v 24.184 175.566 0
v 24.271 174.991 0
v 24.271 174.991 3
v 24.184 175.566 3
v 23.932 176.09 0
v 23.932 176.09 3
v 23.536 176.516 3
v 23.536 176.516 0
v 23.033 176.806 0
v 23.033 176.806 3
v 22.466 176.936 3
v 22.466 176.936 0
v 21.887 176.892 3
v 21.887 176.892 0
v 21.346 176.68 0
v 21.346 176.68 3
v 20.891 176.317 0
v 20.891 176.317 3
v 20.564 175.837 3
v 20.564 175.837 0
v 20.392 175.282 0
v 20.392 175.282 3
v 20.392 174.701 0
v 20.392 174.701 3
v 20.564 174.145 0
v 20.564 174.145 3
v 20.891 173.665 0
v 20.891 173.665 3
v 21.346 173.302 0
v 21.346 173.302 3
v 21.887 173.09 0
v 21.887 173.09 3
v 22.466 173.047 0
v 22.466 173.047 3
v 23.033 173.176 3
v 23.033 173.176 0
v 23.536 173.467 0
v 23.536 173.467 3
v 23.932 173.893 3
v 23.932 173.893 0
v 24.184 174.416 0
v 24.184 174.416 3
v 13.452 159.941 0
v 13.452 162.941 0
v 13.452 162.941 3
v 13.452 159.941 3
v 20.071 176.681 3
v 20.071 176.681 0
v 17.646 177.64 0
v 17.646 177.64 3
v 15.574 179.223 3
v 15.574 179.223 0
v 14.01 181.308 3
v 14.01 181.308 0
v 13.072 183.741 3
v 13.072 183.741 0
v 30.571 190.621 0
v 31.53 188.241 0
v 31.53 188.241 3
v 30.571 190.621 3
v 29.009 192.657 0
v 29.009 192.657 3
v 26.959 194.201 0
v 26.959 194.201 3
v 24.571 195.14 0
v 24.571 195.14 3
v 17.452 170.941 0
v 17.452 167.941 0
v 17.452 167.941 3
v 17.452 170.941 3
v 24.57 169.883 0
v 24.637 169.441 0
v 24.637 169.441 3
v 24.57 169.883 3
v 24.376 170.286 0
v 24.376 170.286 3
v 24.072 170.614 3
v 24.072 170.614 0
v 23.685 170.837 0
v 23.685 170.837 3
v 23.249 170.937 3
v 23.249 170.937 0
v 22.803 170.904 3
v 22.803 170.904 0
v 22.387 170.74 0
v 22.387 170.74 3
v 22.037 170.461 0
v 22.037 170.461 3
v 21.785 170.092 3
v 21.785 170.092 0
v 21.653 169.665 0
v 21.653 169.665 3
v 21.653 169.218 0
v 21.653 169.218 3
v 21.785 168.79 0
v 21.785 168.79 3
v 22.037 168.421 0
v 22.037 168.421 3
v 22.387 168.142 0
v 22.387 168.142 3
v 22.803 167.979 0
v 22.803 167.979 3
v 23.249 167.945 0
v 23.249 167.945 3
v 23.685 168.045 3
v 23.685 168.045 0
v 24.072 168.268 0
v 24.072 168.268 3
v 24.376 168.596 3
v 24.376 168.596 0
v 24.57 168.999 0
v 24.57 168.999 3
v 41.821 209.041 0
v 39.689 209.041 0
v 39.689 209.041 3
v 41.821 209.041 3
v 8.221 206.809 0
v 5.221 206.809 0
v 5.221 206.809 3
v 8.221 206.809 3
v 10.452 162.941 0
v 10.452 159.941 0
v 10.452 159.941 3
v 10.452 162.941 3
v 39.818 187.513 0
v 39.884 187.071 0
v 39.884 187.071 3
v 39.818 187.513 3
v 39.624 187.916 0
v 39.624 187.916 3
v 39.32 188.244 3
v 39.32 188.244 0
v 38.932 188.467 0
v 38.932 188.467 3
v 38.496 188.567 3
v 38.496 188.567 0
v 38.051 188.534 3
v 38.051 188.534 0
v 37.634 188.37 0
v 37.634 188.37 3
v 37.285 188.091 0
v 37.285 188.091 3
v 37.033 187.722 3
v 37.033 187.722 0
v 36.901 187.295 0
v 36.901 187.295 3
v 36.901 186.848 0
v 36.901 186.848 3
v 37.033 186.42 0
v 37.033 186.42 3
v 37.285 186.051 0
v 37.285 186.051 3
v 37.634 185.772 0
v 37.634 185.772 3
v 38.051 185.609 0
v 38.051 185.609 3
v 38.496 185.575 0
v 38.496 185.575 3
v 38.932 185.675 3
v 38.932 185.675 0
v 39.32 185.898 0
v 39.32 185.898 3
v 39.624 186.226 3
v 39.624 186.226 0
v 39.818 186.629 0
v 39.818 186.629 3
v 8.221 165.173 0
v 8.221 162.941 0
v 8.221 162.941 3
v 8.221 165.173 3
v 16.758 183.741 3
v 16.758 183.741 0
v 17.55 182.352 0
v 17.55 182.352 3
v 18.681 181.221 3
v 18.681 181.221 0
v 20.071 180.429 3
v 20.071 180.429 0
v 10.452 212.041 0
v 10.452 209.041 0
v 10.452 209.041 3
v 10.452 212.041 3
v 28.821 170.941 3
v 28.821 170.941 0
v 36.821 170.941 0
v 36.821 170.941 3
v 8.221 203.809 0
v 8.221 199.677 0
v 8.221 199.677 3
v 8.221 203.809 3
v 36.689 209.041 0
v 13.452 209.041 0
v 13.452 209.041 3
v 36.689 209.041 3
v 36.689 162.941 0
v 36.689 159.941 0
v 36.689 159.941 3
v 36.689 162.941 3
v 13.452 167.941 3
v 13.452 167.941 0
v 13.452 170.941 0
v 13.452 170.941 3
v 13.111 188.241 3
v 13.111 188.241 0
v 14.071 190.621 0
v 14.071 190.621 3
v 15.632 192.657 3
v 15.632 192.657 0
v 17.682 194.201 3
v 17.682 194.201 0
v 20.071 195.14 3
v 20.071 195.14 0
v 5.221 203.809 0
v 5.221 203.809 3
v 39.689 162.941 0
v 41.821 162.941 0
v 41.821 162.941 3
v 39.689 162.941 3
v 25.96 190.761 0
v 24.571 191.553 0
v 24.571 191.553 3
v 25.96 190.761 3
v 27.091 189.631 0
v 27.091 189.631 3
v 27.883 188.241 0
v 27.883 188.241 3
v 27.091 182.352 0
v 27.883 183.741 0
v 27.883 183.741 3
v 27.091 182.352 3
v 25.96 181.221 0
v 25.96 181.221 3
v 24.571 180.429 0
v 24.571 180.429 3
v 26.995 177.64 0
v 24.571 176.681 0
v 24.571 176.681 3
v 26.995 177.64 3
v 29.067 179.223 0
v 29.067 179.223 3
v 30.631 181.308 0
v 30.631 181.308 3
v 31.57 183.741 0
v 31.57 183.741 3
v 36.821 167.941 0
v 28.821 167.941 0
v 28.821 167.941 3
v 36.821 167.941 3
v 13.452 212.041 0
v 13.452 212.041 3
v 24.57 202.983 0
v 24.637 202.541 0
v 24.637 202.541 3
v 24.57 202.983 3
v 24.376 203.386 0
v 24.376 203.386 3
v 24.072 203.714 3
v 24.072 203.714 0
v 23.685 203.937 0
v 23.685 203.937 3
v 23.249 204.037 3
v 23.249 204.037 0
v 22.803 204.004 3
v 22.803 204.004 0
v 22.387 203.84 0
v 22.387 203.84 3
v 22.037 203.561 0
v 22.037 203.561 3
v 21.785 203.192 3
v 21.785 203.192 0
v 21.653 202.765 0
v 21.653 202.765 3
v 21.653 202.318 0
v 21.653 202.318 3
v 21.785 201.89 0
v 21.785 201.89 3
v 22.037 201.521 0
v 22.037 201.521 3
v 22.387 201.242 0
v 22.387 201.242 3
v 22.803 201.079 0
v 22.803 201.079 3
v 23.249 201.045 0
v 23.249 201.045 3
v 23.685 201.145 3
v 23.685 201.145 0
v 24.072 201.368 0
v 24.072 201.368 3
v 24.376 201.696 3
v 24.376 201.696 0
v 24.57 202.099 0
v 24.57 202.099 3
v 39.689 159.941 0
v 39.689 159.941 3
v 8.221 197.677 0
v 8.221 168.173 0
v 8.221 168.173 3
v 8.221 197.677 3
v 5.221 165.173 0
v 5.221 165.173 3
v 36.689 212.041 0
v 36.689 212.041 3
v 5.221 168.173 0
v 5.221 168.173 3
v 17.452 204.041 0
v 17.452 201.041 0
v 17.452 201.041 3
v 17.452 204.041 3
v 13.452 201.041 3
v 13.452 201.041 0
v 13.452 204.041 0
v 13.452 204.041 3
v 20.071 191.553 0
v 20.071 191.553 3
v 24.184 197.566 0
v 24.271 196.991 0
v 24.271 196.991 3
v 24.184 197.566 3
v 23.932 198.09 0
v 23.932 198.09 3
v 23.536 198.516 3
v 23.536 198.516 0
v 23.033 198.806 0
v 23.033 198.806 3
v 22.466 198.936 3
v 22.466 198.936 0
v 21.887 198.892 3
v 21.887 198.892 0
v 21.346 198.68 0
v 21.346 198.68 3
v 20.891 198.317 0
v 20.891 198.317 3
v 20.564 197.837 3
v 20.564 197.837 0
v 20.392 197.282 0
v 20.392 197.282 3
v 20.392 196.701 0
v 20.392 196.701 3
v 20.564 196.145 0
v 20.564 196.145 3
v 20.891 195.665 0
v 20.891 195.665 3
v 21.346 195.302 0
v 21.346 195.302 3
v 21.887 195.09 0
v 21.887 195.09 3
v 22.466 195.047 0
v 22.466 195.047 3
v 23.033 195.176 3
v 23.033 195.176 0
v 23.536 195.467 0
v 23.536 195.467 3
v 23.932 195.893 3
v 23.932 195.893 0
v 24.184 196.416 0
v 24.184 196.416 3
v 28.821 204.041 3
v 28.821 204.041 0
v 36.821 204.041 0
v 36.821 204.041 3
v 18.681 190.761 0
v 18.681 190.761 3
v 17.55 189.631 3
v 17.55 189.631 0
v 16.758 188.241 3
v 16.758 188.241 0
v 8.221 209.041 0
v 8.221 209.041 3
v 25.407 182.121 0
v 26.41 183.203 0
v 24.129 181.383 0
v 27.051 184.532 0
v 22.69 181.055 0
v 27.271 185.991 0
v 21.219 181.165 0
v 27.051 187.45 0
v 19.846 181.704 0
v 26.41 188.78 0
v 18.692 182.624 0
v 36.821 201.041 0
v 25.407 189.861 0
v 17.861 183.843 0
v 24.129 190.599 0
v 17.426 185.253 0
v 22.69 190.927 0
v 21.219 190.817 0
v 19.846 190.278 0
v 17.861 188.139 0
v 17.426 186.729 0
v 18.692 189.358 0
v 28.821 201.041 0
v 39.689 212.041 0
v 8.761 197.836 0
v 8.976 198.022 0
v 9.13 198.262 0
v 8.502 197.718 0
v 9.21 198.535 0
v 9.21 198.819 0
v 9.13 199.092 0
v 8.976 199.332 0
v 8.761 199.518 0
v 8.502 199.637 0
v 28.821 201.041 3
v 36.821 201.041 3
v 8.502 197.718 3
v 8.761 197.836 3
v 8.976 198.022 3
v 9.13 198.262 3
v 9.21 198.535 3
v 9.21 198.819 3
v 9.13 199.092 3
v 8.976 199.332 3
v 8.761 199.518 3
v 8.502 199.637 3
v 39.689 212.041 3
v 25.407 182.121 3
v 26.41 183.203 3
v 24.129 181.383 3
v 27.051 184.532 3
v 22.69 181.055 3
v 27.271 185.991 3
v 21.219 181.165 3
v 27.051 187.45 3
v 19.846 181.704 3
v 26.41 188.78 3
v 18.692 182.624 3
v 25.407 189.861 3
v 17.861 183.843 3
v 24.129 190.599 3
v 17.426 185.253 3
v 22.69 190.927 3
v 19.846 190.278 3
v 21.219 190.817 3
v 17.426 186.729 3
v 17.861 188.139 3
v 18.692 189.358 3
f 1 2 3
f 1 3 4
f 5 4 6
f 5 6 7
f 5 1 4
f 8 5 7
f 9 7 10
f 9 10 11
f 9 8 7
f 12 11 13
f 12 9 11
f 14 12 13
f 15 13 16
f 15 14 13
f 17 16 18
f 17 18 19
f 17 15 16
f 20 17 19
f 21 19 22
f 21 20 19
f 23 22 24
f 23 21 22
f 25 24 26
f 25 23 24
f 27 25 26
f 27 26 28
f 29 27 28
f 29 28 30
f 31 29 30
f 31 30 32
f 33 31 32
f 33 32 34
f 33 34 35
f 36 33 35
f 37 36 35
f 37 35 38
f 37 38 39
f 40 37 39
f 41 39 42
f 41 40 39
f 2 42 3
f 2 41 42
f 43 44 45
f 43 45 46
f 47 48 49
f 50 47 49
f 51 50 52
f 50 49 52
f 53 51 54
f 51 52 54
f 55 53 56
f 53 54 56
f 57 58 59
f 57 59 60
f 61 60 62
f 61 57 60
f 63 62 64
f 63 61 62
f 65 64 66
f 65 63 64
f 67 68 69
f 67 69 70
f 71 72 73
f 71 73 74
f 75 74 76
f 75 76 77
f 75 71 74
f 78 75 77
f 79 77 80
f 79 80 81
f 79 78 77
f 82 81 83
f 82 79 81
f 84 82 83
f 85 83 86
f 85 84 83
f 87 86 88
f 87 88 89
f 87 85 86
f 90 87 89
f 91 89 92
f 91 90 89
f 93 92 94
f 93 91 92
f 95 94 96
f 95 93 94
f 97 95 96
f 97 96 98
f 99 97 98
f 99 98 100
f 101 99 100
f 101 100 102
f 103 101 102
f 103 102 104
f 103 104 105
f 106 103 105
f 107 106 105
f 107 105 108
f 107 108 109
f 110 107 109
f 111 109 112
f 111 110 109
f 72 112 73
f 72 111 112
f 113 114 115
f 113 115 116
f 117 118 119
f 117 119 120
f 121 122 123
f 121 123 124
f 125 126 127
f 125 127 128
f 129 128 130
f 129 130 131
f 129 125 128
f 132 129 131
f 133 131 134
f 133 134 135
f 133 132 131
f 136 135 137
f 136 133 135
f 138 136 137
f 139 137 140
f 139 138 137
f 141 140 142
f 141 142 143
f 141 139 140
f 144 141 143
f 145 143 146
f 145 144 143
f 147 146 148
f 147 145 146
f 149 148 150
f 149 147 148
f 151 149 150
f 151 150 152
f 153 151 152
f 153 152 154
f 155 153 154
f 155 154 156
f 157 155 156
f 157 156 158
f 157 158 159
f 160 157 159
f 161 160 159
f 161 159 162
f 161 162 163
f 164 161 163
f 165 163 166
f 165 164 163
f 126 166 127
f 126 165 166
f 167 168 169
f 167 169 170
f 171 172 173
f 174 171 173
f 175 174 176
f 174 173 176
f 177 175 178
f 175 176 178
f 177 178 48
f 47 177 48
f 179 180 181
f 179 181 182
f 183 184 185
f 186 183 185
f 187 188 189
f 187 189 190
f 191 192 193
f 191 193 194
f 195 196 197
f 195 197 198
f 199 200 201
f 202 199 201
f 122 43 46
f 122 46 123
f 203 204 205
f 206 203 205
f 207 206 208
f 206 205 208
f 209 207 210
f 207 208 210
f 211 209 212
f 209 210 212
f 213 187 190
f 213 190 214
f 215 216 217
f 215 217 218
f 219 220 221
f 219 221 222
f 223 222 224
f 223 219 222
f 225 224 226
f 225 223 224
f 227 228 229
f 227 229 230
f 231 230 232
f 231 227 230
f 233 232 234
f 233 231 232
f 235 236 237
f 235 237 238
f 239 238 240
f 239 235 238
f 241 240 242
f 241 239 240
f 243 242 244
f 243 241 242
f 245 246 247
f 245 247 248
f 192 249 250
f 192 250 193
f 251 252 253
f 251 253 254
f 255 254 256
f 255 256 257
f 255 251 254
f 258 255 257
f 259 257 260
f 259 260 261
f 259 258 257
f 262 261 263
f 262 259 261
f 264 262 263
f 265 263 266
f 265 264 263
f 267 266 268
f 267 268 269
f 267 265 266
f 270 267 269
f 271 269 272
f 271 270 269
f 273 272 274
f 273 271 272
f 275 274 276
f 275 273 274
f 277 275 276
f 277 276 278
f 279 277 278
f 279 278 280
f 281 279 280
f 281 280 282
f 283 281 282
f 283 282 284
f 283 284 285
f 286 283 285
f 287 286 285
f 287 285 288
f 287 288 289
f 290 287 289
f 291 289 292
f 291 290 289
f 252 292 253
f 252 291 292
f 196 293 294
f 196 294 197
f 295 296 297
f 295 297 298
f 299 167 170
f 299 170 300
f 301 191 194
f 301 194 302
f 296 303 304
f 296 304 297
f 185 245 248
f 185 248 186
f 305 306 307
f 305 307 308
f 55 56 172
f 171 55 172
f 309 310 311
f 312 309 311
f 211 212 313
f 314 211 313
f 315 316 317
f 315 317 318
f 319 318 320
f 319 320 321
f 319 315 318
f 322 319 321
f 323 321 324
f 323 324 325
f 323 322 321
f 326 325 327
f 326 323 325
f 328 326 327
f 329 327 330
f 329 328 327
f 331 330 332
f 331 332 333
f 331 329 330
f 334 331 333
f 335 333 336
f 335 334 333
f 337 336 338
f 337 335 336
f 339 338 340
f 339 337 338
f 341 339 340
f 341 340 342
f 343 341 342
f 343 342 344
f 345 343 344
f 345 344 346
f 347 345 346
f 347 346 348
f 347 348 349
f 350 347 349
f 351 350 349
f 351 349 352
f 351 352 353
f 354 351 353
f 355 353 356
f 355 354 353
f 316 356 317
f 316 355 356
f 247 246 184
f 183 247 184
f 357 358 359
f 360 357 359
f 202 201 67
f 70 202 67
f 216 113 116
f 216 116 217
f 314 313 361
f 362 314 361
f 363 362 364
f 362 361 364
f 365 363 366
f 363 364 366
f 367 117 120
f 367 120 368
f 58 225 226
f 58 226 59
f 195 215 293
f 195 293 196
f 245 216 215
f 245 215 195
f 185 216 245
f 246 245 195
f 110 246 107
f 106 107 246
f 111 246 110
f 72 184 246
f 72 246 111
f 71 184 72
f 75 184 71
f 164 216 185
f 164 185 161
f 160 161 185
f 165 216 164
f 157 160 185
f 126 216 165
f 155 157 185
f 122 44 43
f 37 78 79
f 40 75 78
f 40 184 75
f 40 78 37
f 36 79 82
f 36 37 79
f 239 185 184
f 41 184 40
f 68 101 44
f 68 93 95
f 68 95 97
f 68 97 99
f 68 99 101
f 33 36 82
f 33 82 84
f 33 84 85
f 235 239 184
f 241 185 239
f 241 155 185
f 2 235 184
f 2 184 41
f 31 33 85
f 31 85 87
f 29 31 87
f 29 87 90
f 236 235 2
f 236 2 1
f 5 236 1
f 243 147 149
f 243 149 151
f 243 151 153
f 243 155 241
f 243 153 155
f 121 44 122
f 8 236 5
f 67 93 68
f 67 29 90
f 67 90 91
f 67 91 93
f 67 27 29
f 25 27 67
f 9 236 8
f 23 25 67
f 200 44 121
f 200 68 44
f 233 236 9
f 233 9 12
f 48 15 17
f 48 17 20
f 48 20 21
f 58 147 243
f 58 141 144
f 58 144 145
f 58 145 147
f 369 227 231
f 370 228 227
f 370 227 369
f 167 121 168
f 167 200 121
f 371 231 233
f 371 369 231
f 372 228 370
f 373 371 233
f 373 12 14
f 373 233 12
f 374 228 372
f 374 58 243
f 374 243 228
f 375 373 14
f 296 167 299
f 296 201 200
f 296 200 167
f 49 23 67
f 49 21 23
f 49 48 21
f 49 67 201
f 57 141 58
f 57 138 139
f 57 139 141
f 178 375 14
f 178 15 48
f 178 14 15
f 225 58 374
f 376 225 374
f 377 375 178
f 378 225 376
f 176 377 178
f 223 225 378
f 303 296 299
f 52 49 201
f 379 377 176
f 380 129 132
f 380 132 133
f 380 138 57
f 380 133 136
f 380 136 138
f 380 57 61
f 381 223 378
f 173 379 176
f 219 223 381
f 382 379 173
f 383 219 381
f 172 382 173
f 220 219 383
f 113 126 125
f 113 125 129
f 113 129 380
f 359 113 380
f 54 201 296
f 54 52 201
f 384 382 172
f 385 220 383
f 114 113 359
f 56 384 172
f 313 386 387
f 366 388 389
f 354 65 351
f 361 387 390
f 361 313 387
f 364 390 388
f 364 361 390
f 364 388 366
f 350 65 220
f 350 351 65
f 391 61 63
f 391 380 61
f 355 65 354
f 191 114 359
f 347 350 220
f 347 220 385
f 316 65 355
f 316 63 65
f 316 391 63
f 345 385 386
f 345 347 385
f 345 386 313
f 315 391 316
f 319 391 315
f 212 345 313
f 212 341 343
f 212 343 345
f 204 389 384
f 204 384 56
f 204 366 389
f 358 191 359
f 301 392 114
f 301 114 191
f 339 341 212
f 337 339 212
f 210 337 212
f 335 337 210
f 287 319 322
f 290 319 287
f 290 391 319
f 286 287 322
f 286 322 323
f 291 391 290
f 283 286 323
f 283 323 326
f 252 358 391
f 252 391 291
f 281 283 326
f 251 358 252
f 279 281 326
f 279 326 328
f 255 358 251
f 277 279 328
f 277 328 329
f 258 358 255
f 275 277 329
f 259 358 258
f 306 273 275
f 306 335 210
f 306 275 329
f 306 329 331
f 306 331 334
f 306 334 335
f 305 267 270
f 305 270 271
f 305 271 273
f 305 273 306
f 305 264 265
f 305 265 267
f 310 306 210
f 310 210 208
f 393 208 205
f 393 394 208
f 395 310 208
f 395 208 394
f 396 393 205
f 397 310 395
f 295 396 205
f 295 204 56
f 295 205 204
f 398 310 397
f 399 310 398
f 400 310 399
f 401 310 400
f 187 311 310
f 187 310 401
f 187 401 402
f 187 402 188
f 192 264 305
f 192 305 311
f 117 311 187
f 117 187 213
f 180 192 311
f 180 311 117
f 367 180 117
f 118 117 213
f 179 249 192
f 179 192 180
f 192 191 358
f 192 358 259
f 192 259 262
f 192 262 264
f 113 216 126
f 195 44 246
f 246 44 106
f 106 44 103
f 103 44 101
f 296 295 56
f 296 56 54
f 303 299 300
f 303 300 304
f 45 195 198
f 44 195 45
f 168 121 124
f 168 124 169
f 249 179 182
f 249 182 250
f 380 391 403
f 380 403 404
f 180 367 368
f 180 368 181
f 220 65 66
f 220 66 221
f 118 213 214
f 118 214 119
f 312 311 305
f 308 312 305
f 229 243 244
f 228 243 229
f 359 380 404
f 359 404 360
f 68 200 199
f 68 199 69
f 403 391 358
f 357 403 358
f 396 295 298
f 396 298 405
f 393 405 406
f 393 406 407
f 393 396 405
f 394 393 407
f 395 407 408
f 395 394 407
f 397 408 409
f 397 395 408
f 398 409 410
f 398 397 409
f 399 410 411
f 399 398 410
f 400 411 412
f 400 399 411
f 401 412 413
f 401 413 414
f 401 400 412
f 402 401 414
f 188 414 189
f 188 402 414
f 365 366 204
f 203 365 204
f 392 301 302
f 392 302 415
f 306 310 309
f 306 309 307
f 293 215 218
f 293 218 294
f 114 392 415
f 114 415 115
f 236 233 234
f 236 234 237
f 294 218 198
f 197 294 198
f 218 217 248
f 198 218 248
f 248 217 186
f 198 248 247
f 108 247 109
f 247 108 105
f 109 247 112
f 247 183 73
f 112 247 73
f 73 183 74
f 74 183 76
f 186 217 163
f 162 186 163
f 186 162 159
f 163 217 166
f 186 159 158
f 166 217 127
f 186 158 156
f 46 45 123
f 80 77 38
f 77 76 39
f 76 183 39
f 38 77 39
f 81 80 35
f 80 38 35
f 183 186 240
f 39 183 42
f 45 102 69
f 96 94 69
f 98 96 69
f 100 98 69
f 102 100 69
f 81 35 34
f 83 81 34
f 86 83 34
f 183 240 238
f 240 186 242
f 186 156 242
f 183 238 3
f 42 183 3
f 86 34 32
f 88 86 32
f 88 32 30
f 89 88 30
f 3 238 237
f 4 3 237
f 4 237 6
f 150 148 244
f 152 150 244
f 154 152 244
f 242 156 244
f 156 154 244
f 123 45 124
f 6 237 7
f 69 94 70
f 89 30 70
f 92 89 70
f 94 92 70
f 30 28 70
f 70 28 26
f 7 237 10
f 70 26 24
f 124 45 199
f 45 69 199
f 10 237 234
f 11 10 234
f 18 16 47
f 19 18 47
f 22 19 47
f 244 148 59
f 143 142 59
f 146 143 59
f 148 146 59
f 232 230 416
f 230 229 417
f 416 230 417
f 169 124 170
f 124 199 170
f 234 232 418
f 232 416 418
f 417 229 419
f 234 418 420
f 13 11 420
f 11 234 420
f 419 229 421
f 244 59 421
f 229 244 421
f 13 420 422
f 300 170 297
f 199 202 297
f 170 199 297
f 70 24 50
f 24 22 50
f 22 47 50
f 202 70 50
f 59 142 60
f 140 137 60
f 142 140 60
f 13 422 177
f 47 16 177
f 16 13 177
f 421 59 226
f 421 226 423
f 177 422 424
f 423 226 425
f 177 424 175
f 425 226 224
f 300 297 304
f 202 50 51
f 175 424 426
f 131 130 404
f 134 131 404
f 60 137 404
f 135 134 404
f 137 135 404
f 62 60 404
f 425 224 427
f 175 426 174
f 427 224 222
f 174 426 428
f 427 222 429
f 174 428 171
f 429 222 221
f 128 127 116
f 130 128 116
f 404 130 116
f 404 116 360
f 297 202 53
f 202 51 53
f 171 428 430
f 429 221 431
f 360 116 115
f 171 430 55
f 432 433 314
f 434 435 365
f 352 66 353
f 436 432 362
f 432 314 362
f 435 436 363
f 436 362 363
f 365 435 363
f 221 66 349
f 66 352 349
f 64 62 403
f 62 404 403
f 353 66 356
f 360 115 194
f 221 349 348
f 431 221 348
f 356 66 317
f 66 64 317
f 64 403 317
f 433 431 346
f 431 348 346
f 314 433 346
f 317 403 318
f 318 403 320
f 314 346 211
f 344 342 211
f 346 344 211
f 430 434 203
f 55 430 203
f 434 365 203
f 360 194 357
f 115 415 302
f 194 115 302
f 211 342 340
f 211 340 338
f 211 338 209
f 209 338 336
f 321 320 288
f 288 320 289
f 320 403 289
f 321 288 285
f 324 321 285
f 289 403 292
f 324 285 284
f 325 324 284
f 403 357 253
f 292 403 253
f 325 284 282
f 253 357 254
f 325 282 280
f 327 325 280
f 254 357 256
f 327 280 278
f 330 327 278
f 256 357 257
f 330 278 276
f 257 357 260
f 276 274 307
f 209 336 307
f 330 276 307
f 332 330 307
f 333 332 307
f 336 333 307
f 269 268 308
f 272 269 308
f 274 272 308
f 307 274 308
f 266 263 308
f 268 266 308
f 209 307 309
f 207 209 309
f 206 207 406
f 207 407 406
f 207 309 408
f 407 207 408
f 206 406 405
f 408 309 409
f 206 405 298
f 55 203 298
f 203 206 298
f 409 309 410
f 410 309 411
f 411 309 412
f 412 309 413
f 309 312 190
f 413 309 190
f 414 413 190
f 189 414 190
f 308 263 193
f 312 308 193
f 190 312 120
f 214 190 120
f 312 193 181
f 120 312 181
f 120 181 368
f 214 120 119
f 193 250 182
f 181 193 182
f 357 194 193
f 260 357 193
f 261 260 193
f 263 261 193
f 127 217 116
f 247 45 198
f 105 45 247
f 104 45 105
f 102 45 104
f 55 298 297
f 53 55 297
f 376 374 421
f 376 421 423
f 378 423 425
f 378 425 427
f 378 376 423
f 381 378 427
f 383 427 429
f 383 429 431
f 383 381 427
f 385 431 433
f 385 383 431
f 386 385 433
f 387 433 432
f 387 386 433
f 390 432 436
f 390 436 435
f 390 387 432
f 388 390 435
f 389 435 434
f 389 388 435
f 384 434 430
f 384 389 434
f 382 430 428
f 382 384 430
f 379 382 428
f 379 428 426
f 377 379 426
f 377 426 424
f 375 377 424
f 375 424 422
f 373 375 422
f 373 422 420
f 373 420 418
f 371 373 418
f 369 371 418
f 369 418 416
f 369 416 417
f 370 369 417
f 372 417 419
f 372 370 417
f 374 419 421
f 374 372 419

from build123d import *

# Parameters (mm, degrees)
SKETCH1_R           = 1.95
SKETCH1_R_2         = 4.95
SKETCH1_R_3         = 1.5
SKETCH1_W           = 4
SKETCH1_H           = 3
SKETCH1_W_2         = 8
BOSS_EXTRUDE1_DEPTH = 3


with BuildPart() as part:
    # Sketch1 → Boss-Extrude1 (new body)
    with BuildSketch(Plane.XY):
        with BuildLine():
            Line((10.452483063, 212.041147496), (13.452483063, 212.041147496))
            Line((13.452483063, 212.041147496), (13.452483063, 209.041147496))
            Line((13.452483063, 209.041147496), (36.688713563, 209.041147496))
            Line((36.688713563, 209.041147496), (36.688713563, 212.041147496))
            Line((36.688713563, 212.041147496), (39.688713563, 212.041147496))
            Line((39.688713563, 212.041147496), (39.688713563, 209.041147496))
            Line((39.688713563, 209.041147496), (41.820598563, 209.041147496))
            Line((41.820598563, 209.041147496), (41.820598563, 162.941147496))
            Line((41.820598563, 162.941147496), (39.688713563, 162.941147496))
            Line((39.688713563, 162.941147496), (39.688713563, 159.941147496))
            Line((39.688713563, 159.941147496), (36.688713563, 159.941147496))
            Line((36.688713563, 159.941147496), (36.688713563, 162.941147496))
            Line((36.688713563, 162.941147496), (13.452483063, 162.941147496))
            Line((13.452483063, 162.941147496), (13.452483063, 159.941147496))
            Line((13.452483063, 159.941147496), (10.452483063, 159.941147496))
            Line((10.452483063, 159.941147496), (10.452483063, 162.941147496))
            Line((10.452483063, 162.941147496), (8.220599063, 162.941147496))
            Line((8.220599063, 162.941147496), (8.220599063, 165.173047496))
            Line((8.220599063, 165.173047496), (5.220599063, 165.173047496))
            Line((5.220599063, 165.173047496), (5.220599063, 168.173047496))
            Line((5.220599063, 168.173047496), (8.220599063, 168.173047496))
            Line((8.220599063, 168.173047496), (8.220599063, 197.67702847))
            ThreePointArc((8.220599063, 197.67702847), (9.220599063, 198.67702847), (8.220599063, 199.67702847))
            Line((8.220599063, 199.67702847), (8.220599063, 203.809247496))
            Line((8.220599063, 203.809247496), (5.220599063, 203.809247496))
            Line((5.220599063, 203.809247496), (5.220599063, 206.809247496))
            Line((5.220599063, 206.809247496), (8.220599063, 206.809247496))
            Line((8.220599063, 206.809247496), (8.220599063, 209.041147496))
            Line((8.220599063, 209.041147496), (10.452483063, 209.041147496))
            Line((10.452483063, 209.041147496), (10.452483063, 212.041147496))
        make_face()
        with Locations((22.320563722, 174.991147496)):
            Circle(SKETCH1_R, mode=Mode.SUBTRACT)
        with Locations((22.320563722, 196.991147496)):
            Circle(SKETCH1_R, mode=Mode.SUBTRACT)
        with Locations((22.320563664, 185.991147472)):
            Circle(SKETCH1_R_2, mode=Mode.SUBTRACT)
        with Locations((23.136540813, 202.541147496)):
            Circle(SKETCH1_R_3, mode=Mode.SUBTRACT)
        with Locations((23.136540813, 169.441147496)):
            Circle(SKETCH1_R_3, mode=Mode.SUBTRACT)
        with Locations((38.384299654, 187.07114189)):
            Circle(SKETCH1_R_3, mode=Mode.SUBTRACT)
        with BuildLine():
            Line((24.570563601, 195.140420085), (24.570563601, 191.553296454))
            ThreePointArc((24.570563601, 191.553296454), (26.563204369, 190.233788261), (27.882712601, 188.241147519))
            Line((27.882712601, 188.241147519), (31.530290537, 188.241147451))
            ThreePointArc((31.530290537, 188.241147451), (29.008711809, 192.657465398), (24.570563601, 195.140420085))
        make_face(mode=Mode.SUBTRACT)
        with BuildLine():
            Line((24.570563644, 180.428998653), (24.570563644, 176.681005512))
            ThreePointArc((24.570563644, 176.681005512), (29.067254316, 179.222501964), (31.569508813, 183.741147077))
            Line((31.569508813, 183.741147077), (27.882712476, 183.741147475))
            ThreePointArc((27.882712476, 183.741147475), (26.563204309, 181.748506814), (24.570563644, 180.428998653))
        make_face(mode=Mode.SUBTRACT)
        with BuildLine():
            Line((20.070563652, 195.14042048), (20.070563706, 191.55329637))
            ThreePointArc((20.070563706, 191.55329637), (18.077922992, 190.233788194), (16.758414793, 188.241147496))
            Line((16.758414793, 188.241147496), (13.110836488, 188.241147112))
            ThreePointArc((13.110836488, 188.241147112), (15.632415205, 192.657465481), (20.070563652, 195.14042048))
        make_face(mode=Mode.SUBTRACT)
        with BuildLine():
            Line((20.070563635, 180.428998551), (20.070563635, 176.68100541))
            ThreePointArc((20.070563635, 176.68100541), (15.573873029, 179.222501964), (13.071618593, 183.741147101))
            Line((13.071618593, 183.741147101), (16.758414722, 183.741147496))
            ThreePointArc((16.758414722, 183.741147496), (18.077922913, 181.748506761), (20.070563635, 180.428998551))
        make_face(mode=Mode.SUBTRACT)
        with Locations((15.452483063, 202.541147496)):
            Rectangle(SKETCH1_W, SKETCH1_H, mode=Mode.SUBTRACT)
        with Locations((32.820598563, 202.541147496)):
            Rectangle(SKETCH1_W_2, SKETCH1_H, mode=Mode.SUBTRACT)
        with Locations((15.452483063, 169.441147496)):
            Rectangle(SKETCH1_W, SKETCH1_H, mode=Mode.SUBTRACT)
        with Locations((32.820598563, 169.441147496)):
            Rectangle(SKETCH1_W_2, SKETCH1_H, mode=Mode.SUBTRACT)
    extrude(amount=BOSS_EXTRUDE1_DEPTH)


solid = part.part
